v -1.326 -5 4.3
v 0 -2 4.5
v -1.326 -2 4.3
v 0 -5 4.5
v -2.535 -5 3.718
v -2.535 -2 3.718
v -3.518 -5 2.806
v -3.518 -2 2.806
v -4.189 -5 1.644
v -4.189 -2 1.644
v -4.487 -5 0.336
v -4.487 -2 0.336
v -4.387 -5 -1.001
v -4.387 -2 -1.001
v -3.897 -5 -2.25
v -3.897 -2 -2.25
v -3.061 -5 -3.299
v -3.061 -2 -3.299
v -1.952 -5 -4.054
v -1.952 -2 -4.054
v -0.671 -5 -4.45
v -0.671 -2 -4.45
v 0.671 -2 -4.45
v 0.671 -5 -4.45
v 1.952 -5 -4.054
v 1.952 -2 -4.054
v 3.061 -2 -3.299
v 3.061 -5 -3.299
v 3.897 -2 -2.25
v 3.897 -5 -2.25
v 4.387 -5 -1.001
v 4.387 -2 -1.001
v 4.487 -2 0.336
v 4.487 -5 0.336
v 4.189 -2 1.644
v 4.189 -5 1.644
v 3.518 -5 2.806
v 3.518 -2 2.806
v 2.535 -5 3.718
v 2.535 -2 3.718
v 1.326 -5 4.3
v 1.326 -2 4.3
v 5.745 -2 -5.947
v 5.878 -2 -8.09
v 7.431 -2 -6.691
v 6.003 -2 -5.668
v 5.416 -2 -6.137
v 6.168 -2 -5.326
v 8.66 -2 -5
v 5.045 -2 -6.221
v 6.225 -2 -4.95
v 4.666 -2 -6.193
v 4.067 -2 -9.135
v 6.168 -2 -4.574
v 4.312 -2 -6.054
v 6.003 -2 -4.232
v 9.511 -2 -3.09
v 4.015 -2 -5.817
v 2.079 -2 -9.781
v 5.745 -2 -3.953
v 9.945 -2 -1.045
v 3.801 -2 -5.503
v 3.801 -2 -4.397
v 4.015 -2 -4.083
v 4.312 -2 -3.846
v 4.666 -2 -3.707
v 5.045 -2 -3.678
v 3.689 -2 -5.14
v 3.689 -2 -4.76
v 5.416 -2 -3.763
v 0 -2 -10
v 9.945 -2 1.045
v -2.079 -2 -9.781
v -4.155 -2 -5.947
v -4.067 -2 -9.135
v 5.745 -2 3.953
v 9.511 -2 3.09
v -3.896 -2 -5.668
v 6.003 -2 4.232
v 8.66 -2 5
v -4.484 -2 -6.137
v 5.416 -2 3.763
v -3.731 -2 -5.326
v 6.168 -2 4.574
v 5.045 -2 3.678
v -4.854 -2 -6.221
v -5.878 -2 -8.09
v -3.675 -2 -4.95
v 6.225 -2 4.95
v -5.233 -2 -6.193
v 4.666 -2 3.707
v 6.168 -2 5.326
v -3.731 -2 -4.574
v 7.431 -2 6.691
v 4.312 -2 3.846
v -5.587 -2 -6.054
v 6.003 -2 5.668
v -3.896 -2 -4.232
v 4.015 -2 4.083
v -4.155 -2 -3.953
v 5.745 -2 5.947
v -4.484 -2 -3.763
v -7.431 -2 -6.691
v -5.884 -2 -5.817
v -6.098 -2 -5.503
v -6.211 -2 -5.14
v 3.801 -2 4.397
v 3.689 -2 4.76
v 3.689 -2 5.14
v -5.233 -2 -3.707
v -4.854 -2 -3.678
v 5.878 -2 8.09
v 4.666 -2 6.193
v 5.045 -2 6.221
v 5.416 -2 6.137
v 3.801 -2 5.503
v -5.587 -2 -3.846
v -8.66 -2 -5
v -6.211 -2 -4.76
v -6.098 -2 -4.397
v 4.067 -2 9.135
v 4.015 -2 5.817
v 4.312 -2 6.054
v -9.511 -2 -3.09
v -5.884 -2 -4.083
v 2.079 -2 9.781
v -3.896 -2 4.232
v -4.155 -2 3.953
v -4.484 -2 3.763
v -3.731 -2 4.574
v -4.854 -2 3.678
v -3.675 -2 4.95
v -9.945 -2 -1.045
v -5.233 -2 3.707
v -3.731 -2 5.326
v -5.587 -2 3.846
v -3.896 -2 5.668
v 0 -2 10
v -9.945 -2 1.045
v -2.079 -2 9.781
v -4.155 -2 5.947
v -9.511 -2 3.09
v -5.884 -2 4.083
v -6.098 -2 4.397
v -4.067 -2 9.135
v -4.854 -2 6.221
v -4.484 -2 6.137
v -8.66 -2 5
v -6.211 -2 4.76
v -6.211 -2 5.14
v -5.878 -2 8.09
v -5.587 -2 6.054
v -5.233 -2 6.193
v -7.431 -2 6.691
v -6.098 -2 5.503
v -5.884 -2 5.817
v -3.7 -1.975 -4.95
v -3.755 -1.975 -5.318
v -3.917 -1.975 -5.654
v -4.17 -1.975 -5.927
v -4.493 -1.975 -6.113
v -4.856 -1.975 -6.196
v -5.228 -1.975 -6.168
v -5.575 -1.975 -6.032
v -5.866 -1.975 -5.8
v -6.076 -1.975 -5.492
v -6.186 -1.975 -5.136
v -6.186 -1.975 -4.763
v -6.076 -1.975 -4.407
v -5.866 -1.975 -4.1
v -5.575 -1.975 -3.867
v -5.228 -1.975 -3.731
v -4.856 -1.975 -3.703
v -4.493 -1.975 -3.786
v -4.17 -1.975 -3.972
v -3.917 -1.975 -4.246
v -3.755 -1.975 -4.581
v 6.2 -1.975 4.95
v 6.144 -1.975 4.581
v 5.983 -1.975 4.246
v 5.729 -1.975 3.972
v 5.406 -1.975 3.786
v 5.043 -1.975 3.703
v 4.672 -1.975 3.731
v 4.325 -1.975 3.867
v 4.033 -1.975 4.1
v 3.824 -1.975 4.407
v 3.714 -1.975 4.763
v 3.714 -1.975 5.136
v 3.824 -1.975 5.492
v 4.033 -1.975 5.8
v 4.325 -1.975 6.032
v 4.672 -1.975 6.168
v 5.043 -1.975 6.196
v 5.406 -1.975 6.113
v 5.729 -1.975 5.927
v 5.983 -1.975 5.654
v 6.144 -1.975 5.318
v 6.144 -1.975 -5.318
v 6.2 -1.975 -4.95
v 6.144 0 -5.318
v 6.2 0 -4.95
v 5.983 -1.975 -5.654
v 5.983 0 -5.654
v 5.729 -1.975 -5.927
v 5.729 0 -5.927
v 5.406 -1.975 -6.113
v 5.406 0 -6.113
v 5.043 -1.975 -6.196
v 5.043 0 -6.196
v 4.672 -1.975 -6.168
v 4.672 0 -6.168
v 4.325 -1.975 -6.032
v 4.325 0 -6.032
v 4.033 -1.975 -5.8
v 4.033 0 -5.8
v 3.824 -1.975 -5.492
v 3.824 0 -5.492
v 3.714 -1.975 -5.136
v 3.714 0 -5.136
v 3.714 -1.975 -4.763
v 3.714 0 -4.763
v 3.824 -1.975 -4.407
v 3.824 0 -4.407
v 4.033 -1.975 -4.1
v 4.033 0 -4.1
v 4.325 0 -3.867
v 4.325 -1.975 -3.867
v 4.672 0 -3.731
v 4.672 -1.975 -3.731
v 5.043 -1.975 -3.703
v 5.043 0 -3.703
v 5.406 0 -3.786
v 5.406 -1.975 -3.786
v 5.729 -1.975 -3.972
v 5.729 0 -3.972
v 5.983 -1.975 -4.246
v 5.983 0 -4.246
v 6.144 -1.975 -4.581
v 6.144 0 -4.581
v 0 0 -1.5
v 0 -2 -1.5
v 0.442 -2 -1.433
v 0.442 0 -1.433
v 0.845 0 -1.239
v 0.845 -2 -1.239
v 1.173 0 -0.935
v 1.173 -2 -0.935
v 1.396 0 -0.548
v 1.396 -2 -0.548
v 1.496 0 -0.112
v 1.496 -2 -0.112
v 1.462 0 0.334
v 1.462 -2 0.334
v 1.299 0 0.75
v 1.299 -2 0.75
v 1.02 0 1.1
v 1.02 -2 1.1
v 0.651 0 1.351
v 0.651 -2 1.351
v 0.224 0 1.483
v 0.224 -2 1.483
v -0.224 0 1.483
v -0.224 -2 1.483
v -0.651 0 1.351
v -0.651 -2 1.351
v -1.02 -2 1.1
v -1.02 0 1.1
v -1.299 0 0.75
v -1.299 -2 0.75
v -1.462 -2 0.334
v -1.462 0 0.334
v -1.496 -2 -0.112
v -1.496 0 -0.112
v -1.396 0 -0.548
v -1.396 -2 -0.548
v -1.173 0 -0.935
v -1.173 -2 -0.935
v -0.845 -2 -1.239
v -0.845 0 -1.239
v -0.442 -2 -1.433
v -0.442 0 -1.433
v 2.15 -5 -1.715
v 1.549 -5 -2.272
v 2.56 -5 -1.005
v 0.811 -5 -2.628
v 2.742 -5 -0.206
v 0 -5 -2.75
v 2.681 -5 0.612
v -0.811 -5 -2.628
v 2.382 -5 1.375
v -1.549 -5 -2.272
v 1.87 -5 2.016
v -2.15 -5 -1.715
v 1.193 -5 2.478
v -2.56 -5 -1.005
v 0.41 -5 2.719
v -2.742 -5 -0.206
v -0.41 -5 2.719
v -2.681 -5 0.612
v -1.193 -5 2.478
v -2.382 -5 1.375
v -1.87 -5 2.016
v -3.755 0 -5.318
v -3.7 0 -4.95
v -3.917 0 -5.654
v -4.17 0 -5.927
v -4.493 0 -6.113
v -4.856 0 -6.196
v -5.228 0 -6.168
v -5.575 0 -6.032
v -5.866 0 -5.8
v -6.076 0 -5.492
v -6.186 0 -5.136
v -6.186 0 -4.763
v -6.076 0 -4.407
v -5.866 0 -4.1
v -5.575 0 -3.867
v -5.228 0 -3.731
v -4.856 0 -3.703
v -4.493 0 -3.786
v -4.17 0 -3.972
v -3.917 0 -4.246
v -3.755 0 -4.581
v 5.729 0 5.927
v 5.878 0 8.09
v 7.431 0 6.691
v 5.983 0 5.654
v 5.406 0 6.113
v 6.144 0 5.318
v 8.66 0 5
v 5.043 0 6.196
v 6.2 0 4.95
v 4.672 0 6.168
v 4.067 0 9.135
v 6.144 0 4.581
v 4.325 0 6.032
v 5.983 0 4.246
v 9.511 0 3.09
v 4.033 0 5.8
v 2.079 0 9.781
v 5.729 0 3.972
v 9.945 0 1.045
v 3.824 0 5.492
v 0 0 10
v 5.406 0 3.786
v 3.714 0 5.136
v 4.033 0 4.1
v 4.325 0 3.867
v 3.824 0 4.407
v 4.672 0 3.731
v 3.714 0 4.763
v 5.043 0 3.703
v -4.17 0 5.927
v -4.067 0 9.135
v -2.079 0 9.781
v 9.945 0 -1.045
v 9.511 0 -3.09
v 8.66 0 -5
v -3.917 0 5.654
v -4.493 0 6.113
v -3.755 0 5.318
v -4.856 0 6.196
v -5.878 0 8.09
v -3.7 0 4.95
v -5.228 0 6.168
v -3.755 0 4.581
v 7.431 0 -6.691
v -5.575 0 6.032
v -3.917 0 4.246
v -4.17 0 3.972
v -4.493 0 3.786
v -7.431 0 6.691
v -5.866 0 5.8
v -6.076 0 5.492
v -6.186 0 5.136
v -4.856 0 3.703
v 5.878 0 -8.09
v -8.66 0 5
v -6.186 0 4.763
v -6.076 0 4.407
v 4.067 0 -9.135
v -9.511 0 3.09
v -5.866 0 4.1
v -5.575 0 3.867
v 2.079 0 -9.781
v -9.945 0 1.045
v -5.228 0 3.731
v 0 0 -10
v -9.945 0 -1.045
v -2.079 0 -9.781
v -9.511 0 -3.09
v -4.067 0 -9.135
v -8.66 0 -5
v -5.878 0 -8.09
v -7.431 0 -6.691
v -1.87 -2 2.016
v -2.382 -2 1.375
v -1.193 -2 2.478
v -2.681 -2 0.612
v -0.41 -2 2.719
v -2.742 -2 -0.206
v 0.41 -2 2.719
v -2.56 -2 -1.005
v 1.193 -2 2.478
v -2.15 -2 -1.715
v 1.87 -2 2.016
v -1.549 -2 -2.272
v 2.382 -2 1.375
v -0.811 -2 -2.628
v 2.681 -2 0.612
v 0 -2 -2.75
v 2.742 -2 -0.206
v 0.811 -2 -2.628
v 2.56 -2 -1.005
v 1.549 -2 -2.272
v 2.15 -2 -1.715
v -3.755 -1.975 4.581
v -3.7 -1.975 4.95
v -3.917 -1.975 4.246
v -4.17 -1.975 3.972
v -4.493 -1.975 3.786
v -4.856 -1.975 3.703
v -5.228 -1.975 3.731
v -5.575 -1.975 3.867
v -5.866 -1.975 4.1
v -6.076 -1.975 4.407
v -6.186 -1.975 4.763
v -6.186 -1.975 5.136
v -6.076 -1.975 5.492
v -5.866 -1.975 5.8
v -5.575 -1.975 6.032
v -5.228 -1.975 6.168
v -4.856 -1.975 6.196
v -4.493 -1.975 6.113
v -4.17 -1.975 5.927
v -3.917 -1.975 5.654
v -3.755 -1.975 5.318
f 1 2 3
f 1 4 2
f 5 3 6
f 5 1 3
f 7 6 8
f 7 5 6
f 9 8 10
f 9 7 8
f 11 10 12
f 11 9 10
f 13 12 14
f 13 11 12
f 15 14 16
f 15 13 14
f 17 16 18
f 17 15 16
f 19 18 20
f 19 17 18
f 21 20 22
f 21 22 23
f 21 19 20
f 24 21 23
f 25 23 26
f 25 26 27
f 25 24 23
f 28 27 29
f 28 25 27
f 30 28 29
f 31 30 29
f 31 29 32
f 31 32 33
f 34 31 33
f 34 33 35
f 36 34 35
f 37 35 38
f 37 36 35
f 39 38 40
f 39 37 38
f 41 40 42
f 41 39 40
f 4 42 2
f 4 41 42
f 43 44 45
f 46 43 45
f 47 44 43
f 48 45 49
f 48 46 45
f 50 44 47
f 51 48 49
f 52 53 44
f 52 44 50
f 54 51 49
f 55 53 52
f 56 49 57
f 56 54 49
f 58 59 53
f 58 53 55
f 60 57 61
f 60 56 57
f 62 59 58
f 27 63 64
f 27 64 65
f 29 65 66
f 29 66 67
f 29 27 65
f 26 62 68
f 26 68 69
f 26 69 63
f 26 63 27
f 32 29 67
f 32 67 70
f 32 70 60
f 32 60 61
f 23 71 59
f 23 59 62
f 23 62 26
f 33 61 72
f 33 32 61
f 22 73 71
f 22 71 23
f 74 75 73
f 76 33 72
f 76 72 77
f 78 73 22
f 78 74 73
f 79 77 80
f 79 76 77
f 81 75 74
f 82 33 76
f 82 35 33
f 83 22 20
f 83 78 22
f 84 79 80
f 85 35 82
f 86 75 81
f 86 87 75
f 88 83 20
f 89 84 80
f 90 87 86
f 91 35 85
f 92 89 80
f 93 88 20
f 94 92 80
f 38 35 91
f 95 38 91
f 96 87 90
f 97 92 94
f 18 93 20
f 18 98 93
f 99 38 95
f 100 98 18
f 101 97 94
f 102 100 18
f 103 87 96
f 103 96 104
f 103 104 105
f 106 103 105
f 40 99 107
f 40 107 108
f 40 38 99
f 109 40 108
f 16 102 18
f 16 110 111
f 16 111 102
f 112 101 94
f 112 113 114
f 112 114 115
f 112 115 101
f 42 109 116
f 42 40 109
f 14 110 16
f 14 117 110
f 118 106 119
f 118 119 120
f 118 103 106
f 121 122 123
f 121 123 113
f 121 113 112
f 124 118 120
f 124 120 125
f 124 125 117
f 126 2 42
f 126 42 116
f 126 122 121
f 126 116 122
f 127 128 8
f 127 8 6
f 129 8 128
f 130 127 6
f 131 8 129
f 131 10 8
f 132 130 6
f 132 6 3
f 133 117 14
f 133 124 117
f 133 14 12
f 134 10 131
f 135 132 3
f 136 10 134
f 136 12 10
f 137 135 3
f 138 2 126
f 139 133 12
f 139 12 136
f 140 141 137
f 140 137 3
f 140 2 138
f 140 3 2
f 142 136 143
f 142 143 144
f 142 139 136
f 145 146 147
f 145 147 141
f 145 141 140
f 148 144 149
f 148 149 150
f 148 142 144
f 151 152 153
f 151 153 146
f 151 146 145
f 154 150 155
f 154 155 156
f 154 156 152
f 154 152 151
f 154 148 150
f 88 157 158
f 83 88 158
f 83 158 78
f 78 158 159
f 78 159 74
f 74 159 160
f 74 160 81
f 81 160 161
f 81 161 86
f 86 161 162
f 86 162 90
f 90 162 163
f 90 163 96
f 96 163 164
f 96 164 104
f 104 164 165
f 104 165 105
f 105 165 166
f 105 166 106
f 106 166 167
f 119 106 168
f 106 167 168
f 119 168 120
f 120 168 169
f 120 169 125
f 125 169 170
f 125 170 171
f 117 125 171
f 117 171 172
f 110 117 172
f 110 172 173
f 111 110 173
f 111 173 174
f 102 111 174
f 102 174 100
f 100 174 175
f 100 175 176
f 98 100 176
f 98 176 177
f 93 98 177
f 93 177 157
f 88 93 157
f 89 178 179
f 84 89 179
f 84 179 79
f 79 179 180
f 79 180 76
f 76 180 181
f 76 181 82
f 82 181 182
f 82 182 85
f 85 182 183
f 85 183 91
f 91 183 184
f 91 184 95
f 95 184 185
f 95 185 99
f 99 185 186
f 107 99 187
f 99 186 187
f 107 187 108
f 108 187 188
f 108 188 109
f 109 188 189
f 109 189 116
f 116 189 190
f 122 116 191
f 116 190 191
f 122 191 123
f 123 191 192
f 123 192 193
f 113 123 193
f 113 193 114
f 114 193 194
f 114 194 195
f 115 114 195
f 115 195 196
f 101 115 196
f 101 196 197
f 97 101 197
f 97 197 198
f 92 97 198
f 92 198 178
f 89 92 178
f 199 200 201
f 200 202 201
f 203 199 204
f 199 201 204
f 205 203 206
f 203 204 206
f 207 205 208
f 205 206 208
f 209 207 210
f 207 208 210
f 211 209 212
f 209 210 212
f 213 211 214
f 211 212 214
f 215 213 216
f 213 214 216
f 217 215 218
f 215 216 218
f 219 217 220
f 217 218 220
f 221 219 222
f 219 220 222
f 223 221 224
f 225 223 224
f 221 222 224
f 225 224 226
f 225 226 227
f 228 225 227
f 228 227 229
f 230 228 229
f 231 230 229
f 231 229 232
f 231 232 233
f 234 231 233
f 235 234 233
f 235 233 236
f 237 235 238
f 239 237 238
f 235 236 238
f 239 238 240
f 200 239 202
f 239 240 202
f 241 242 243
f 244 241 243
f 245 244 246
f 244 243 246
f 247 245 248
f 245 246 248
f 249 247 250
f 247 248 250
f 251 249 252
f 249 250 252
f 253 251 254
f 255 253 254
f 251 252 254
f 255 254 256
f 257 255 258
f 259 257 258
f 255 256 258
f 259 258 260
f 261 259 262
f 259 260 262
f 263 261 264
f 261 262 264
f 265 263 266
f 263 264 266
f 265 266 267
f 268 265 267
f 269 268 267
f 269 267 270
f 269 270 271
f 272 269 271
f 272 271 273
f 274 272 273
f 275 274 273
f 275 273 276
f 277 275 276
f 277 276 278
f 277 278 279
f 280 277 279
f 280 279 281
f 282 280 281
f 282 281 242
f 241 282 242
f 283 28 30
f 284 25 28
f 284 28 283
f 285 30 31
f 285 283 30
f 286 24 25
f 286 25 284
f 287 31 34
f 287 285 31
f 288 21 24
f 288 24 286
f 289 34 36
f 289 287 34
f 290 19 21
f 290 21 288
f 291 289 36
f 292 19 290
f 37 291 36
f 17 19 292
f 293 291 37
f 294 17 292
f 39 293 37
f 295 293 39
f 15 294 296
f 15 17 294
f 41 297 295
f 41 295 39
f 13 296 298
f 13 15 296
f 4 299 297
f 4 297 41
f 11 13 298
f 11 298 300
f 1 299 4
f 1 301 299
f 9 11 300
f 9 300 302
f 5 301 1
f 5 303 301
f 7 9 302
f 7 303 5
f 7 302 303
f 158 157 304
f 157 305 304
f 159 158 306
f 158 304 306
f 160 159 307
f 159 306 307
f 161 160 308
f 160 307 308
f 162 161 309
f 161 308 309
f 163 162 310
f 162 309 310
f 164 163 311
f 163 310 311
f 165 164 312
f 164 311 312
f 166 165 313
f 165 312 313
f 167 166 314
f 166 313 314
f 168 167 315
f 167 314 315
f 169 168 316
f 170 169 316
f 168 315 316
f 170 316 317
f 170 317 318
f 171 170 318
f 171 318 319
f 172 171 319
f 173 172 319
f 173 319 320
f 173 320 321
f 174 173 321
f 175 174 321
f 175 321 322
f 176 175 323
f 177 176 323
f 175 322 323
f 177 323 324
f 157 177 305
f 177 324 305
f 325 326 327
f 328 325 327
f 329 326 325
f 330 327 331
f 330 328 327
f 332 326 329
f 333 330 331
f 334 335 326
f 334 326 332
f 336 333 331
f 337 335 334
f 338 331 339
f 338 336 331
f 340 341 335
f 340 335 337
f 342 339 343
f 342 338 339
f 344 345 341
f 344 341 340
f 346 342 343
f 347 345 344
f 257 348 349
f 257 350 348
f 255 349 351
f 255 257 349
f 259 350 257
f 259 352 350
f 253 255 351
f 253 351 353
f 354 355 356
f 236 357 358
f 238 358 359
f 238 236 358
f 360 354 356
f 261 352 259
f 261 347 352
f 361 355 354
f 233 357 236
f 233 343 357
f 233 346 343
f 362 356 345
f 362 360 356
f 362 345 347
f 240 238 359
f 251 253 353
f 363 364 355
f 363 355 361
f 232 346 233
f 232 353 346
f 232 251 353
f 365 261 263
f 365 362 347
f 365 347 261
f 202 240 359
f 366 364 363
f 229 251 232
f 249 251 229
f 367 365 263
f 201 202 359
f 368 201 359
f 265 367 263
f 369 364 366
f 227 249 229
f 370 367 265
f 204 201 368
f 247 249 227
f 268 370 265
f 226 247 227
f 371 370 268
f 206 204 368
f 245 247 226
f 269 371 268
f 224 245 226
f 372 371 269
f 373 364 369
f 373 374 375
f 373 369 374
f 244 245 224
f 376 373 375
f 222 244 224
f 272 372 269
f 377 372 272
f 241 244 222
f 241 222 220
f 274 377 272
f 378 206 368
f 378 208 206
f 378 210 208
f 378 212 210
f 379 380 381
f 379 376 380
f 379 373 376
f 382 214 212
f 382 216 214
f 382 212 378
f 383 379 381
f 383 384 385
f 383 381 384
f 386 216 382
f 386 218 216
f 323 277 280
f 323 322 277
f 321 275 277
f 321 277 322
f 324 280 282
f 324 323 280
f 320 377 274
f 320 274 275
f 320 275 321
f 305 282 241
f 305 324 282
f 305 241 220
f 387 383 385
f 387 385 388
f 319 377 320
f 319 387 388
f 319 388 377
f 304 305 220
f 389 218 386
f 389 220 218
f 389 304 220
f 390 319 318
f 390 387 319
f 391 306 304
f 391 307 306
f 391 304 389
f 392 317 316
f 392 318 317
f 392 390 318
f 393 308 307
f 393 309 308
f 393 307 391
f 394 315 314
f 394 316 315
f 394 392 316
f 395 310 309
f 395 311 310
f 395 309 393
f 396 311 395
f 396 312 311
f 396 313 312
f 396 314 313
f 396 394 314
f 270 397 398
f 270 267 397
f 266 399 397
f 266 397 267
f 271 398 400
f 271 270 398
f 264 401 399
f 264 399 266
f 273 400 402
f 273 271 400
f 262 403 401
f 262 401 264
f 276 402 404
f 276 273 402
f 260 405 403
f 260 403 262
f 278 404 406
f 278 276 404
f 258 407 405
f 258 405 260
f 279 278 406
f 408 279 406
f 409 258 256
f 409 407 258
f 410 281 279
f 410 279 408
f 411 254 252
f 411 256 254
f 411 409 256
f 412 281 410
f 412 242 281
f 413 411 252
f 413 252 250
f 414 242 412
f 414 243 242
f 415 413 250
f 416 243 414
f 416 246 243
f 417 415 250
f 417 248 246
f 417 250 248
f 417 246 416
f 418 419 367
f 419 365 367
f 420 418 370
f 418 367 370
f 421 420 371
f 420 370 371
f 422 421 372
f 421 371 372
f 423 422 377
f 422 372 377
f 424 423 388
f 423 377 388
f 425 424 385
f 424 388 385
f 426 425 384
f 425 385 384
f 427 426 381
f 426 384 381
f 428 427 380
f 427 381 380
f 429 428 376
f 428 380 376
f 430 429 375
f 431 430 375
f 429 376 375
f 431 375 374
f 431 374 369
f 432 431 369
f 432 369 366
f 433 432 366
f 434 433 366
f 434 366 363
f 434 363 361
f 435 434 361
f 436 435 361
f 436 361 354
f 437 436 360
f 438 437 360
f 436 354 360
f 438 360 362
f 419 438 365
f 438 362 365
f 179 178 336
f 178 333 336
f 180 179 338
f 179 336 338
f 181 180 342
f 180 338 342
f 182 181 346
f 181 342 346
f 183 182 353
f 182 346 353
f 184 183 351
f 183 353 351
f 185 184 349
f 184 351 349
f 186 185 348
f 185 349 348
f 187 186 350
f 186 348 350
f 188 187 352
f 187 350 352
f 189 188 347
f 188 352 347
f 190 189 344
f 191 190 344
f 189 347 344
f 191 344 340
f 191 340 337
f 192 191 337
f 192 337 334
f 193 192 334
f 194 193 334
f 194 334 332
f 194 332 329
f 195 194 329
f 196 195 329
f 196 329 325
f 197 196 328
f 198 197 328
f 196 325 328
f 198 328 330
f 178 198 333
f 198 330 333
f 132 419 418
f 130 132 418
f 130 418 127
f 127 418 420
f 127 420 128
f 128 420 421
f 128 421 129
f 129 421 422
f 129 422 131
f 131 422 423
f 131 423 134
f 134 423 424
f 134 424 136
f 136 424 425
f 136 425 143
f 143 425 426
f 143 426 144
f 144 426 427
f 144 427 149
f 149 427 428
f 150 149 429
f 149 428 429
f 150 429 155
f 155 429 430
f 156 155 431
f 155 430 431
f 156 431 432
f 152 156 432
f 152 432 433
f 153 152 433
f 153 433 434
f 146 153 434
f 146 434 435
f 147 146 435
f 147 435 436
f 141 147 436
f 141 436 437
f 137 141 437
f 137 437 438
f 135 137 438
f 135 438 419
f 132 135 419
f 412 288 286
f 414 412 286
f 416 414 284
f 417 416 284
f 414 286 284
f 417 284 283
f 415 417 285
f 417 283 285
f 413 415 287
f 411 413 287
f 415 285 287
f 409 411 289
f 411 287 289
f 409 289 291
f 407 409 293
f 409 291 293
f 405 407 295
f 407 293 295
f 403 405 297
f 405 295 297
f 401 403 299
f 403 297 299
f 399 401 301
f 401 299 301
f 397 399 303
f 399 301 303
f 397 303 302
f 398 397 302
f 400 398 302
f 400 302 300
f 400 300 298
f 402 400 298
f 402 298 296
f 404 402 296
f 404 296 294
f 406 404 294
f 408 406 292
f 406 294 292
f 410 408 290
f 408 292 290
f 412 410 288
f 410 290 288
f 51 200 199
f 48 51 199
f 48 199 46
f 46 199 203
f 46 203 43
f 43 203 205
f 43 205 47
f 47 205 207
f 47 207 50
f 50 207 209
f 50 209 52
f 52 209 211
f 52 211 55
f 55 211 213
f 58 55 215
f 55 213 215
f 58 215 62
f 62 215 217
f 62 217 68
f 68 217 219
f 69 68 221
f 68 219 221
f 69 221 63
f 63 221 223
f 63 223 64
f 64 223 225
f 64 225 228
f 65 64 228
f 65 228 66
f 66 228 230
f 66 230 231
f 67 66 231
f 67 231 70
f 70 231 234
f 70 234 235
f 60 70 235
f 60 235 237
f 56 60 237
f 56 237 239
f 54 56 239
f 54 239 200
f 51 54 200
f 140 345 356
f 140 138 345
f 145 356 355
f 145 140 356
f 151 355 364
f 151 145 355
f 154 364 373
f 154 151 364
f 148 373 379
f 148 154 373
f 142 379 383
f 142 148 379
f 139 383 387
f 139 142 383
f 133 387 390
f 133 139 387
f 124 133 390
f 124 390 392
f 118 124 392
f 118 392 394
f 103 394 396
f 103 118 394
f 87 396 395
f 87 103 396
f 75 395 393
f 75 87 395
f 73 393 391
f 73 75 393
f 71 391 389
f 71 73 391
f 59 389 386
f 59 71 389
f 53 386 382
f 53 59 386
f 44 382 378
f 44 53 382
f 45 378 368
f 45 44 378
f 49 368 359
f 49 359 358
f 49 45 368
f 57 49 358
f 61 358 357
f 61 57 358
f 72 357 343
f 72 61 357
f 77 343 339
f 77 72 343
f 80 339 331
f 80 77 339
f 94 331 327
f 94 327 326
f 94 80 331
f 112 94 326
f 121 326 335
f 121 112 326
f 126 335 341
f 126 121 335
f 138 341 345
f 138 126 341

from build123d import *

# Parameters (mm, degrees)
TAP_DRILL_FOR_M3X0_5_TAP1_D           = 2.5
TAP_DRILL_FOR_M3X0_5_TAP1_CSINK_D     = 2.55
TAP_DRILL_FOR_M3X0_5_TAP1_CSINK_ANGLE = 90
SKETCH5_R                             = 2.75
CUT_EXTRUDE1_DEPTH                    = 3
SKETCH6_R                             = 1.5
CUT_EXTRUDE2_DEPTH                    = 15.456832295


with BuildPart() as part:
    # Sketch1 → Revolve1 (revolve)
    with BuildSketch(Plane(origin=(0, 0, 0), x_dir=(0, 0, -1), z_dir=(1, 0, 0))):
        Polygon((0, 0), (-10, 0), (-10, -2), (-4.5, -2), (-4.5, -5), (0, -5), align=None)
    revolve(axis=Axis((0, 0, 0), (0, -1, 0)))

    # Tap Drill for M3x0.5 Tap1 (through all)
    with Locations(Plane(origin=(0, -2, 0), x_dir=(-1, 0, 0), z_dir=(0, -1, 0))):
        with Locations((4.949747468, 4.949747468), (-4.949747468, -4.949747468), (-4.949747468, 4.949747468), (4.949747468, -4.949747468)):
            CounterSinkHole(TAP_DRILL_FOR_M3X0_5_TAP1_D / 2, TAP_DRILL_FOR_M3X0_5_TAP1_CSINK_D / 2, counter_sink_angle=TAP_DRILL_FOR_M3X0_5_TAP1_CSINK_ANGLE)

    # Sketch5 → Cut-Extrude1 (cut)
    with BuildSketch(Plane(origin=(0, -5, 0), x_dir=(-1, 0, 0), z_dir=(0, -1, 0))):
        with Locations(Location((0, 0, 0), (0, 0, 90))):
            Circle(SKETCH5_R)
    extrude(amount=-CUT_EXTRUDE1_DEPTH, mode=Mode.SUBTRACT)

    # Sketch6 → Cut-Extrude2 (cut, through all)
    with BuildSketch(Plane(origin=(0, -2, 0), x_dir=(-1, 0, 0), z_dir=(0, -1, 0))):
        with Locations(Location((0, 0, 0), (0, 0, 90))):
            Circle(SKETCH6_R)
    extrude(amount=-CUT_EXTRUDE2_DEPTH, mode=Mode.SUBTRACT)


solid = part.part
